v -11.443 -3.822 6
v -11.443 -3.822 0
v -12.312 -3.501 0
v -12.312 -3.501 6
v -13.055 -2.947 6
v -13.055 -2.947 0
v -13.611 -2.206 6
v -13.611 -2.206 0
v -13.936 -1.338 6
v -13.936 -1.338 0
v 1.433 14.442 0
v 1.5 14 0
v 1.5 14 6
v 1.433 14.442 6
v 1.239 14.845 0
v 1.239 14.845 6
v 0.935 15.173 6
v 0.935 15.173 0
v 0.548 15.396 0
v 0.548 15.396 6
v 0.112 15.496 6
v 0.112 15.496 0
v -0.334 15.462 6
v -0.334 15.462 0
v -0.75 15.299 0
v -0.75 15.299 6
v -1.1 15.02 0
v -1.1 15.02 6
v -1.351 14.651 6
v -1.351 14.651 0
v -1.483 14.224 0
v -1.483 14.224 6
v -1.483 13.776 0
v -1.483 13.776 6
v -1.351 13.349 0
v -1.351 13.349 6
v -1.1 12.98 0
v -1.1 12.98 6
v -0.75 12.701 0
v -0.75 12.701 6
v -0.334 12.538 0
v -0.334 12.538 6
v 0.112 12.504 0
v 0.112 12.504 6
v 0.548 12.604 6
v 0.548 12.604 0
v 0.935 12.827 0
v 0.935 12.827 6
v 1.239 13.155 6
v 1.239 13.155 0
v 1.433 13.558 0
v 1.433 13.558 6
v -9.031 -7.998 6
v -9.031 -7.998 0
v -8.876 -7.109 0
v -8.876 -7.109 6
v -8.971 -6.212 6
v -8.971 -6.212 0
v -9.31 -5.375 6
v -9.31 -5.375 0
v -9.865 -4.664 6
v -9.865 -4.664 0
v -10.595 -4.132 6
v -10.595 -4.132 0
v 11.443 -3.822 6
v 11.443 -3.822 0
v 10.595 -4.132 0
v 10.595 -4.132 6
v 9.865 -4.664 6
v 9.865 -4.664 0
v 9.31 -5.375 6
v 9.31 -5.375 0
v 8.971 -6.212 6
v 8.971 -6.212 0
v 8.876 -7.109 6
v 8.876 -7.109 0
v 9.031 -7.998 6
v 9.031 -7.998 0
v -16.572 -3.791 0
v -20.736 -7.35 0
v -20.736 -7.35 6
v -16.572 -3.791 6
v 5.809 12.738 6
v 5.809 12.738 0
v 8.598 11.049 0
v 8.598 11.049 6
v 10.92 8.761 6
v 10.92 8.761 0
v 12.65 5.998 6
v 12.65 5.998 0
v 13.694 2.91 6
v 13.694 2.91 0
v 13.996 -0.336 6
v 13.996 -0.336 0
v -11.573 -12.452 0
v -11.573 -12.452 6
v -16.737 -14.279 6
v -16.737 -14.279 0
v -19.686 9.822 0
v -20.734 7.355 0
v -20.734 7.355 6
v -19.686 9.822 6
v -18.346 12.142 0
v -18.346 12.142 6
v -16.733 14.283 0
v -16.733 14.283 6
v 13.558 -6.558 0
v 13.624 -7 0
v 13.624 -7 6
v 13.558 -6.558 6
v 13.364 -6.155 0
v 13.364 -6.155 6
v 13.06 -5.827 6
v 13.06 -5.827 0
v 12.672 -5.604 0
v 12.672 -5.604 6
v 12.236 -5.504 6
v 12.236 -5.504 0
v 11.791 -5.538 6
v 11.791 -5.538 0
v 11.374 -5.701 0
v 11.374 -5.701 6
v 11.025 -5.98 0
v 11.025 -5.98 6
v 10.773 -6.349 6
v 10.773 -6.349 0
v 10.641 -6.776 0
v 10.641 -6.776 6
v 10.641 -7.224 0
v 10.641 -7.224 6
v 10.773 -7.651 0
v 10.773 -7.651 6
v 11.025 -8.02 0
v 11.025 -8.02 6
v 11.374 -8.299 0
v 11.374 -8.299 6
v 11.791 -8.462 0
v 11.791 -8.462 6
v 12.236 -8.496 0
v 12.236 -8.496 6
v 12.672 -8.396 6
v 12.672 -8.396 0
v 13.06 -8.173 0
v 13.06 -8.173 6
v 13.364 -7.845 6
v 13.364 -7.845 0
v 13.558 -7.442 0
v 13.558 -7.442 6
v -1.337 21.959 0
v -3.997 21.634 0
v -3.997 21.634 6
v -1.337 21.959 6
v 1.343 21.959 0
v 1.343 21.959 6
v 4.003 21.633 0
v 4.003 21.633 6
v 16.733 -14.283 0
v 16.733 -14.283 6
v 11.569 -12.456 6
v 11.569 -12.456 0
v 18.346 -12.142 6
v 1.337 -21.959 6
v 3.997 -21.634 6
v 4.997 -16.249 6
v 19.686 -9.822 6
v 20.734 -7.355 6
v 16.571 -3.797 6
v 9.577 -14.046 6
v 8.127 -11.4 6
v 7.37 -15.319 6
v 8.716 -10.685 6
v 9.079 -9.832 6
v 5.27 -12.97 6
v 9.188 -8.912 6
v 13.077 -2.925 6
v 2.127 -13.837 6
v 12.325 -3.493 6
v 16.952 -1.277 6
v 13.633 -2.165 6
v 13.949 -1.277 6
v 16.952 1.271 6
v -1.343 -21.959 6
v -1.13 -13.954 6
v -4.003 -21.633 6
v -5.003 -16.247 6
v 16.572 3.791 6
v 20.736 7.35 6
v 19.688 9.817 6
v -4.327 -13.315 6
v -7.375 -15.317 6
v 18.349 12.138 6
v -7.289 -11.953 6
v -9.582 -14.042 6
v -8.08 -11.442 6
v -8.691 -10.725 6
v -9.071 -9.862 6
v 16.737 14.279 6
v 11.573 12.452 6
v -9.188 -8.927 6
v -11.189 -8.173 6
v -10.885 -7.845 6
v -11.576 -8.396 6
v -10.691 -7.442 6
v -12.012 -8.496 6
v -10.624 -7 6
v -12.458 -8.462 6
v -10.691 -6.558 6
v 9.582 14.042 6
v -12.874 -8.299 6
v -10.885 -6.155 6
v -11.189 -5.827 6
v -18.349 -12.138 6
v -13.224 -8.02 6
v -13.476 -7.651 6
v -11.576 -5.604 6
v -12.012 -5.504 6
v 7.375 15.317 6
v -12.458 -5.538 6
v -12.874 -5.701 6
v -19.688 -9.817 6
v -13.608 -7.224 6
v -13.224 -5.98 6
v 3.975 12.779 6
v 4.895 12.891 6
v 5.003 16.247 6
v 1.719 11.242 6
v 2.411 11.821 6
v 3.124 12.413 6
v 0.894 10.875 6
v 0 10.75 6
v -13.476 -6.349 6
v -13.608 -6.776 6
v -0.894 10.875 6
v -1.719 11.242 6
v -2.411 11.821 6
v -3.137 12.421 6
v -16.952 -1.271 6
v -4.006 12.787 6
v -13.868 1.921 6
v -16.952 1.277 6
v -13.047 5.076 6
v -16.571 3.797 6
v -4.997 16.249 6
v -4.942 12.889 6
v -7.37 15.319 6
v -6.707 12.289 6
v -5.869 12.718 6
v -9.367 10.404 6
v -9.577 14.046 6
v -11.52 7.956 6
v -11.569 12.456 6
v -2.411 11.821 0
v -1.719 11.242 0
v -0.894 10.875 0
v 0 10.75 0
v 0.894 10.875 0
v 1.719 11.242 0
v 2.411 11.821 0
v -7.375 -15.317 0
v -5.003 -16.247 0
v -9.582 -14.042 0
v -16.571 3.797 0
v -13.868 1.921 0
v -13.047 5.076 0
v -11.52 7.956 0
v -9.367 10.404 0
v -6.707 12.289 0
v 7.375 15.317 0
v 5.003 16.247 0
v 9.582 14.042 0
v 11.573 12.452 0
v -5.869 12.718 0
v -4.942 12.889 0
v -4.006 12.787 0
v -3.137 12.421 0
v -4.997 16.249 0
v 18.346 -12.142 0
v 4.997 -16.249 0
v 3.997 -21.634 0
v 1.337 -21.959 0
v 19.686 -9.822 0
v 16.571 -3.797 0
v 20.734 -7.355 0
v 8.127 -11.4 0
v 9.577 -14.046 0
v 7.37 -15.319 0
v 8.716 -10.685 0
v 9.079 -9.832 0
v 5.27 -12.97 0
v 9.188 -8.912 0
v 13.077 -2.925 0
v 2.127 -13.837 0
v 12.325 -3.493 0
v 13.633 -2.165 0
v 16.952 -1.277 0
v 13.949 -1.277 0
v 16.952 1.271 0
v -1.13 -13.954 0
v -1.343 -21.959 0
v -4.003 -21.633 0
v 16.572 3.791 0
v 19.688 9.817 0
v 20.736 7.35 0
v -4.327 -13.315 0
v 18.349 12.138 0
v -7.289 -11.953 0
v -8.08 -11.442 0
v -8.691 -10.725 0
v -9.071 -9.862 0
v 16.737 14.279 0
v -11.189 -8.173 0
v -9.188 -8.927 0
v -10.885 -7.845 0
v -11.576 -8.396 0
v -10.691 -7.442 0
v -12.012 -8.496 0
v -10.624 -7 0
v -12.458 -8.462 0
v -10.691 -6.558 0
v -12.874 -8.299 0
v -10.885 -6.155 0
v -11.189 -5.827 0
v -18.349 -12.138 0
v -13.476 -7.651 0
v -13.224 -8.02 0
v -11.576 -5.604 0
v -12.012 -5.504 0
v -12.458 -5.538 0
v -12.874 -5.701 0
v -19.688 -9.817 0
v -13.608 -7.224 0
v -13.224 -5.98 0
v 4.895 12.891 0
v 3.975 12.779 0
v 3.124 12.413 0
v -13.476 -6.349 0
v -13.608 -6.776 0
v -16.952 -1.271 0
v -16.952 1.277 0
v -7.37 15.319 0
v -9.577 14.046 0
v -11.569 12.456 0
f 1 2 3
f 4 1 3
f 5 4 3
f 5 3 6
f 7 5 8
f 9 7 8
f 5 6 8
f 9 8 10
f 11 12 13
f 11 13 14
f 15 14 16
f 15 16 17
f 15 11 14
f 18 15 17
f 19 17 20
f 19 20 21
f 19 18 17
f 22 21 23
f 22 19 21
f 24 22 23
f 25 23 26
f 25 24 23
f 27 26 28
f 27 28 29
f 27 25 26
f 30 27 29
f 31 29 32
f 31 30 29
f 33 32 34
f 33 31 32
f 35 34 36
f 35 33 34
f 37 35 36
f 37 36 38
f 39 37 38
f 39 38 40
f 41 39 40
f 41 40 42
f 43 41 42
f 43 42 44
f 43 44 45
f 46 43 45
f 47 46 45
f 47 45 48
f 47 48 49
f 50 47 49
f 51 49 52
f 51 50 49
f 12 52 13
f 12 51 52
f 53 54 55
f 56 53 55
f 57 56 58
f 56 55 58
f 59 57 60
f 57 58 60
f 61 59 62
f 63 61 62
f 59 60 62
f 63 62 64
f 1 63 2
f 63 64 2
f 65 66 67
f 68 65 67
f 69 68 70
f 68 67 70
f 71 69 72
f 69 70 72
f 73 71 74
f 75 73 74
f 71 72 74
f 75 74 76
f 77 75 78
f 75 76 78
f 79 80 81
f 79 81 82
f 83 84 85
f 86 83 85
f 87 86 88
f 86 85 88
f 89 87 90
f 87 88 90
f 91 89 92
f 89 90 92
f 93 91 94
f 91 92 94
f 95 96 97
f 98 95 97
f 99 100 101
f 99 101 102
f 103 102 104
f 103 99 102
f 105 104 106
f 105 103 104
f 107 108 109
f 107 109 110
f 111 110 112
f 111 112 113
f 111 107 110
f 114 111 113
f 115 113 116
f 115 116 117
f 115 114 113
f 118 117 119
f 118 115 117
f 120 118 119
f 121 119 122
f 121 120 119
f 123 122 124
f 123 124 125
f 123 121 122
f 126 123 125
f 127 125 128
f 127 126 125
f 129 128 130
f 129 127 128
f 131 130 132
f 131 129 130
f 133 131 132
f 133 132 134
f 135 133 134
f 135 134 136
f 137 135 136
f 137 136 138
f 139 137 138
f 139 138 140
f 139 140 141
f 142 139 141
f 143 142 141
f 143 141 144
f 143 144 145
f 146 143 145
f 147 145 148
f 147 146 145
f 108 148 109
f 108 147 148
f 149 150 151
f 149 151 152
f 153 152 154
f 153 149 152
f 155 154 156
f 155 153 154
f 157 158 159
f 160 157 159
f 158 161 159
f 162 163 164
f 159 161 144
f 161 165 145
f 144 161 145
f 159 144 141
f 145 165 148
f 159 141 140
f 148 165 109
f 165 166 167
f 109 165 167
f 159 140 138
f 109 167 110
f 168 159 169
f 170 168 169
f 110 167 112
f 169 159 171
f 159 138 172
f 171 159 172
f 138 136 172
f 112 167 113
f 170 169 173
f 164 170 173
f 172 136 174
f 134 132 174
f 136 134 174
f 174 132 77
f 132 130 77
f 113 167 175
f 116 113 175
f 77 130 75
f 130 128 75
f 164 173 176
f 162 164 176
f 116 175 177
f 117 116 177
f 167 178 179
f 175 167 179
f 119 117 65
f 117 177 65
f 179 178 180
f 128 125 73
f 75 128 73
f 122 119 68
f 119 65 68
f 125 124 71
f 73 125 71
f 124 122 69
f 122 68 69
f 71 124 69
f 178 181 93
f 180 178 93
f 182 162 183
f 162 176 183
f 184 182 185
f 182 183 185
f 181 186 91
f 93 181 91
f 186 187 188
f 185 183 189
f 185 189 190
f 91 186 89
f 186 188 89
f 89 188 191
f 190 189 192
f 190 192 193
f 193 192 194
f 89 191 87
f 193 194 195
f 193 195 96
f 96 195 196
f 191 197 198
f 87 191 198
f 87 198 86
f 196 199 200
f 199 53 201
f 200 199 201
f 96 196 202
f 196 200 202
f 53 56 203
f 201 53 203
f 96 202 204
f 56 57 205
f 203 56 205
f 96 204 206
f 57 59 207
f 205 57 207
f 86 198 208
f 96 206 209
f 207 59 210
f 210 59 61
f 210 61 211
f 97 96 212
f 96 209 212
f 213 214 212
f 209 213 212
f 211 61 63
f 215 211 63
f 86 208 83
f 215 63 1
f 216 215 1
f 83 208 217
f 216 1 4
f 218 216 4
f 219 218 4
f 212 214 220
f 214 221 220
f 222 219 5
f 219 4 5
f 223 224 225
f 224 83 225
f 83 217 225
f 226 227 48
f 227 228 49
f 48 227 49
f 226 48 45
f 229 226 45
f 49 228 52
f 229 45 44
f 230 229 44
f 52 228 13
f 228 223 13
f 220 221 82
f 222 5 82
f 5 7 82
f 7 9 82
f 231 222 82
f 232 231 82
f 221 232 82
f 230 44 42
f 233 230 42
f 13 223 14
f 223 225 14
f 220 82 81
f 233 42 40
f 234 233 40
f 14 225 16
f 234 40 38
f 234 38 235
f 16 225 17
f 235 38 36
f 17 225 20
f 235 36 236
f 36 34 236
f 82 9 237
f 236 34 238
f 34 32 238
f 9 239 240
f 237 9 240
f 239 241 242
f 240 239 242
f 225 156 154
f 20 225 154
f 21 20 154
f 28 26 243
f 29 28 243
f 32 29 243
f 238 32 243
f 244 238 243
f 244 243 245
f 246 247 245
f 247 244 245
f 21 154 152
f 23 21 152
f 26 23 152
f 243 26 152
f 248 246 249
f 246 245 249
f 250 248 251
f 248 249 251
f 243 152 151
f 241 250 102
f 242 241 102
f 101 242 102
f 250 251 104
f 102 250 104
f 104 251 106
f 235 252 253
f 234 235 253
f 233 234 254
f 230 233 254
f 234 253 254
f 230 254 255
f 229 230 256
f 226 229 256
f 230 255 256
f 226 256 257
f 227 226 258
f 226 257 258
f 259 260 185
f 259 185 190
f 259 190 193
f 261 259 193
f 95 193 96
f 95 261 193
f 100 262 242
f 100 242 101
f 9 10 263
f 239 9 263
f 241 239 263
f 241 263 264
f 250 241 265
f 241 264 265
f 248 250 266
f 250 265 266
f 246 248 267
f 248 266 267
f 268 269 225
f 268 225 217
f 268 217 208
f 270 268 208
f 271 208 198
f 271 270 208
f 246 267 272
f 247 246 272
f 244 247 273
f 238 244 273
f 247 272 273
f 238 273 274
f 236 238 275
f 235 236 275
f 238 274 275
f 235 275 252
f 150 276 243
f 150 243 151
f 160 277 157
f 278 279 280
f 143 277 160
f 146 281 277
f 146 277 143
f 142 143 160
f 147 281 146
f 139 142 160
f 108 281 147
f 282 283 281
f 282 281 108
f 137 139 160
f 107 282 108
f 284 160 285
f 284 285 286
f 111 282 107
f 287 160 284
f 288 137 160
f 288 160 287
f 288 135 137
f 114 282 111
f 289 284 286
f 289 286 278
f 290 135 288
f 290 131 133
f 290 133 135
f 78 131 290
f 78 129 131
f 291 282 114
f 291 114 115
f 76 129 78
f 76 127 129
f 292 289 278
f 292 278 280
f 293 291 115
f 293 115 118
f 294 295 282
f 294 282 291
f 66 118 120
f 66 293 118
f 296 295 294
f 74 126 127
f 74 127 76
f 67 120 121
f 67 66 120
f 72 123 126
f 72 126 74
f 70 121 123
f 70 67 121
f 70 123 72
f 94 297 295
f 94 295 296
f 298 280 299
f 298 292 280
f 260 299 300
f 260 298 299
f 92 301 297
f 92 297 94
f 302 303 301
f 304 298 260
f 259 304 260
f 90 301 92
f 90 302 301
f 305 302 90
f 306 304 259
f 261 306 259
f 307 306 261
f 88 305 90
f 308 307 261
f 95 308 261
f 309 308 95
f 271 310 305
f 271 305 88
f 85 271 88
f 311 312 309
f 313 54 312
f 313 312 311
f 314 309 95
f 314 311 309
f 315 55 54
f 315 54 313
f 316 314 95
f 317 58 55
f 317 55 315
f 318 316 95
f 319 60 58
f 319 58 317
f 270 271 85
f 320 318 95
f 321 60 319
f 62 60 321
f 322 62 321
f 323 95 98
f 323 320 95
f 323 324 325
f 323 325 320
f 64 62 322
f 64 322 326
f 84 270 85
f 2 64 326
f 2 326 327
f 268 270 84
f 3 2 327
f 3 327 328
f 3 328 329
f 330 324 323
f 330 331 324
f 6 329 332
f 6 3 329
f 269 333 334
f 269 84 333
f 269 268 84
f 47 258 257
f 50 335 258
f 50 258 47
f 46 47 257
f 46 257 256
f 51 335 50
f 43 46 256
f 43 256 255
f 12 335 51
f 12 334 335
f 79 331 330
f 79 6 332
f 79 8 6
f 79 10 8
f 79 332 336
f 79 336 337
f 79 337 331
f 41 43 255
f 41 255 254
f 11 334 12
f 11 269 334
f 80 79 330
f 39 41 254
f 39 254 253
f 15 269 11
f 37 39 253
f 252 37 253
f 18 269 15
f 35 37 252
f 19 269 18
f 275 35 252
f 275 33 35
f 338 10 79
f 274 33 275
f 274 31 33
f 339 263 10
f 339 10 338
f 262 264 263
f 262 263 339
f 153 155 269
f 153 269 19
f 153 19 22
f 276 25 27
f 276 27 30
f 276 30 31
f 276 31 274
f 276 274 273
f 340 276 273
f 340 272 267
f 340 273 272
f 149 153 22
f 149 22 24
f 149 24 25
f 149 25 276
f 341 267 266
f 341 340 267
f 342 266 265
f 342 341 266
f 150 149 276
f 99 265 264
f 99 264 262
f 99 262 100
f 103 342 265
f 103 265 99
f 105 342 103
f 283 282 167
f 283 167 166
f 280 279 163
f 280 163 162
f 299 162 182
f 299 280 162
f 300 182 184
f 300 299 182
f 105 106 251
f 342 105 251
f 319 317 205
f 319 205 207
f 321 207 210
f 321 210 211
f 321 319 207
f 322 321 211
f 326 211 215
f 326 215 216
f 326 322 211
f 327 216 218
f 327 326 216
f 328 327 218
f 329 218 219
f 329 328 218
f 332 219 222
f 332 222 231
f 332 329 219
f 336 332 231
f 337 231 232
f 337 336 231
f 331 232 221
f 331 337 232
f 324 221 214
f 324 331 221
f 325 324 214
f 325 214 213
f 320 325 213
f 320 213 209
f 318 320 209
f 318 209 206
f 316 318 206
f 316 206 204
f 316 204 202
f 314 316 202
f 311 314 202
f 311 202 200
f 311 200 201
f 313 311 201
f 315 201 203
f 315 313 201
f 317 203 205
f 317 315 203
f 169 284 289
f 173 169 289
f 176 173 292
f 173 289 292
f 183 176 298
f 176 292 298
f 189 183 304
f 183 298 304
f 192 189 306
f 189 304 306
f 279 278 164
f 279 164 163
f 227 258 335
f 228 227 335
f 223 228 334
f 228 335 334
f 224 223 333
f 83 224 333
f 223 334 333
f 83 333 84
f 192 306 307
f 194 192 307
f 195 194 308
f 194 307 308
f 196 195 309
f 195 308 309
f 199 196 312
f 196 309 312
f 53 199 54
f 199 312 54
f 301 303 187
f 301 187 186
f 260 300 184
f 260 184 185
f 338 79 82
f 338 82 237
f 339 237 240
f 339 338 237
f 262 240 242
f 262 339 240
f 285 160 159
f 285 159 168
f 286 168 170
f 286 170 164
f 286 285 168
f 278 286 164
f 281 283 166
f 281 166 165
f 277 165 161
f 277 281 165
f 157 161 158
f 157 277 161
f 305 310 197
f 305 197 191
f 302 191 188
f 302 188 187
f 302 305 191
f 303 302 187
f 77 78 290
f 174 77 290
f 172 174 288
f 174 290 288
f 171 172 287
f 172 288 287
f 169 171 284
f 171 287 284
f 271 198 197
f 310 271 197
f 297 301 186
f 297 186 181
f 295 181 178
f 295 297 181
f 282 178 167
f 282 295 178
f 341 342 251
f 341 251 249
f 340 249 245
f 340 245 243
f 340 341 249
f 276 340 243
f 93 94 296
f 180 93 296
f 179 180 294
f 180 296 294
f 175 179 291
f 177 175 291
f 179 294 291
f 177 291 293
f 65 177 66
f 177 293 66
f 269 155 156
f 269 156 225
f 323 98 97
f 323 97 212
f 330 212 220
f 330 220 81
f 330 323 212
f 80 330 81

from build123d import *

# Parameters (mm, degrees)
ESQUISSE1_R        = 1.5
BOSS_EXTRU_2_DEPTH = 6


with BuildPart() as part:
    # Esquisse1 → Boss.-Extru.2 (new body)
    with BuildSketch(Plane.XY):
        with BuildLine():
            Line((-4.997277712, 16.248914286), (-3.997277712, 21.633810827))
            ThreePointArc((-3.997277712, 21.633810827), (0.002768431, 21.999999826), (4.002722288, 21.632804124))
            Line((4.002722288, 21.632804124), (5.002722288, 16.247238834))
            ThreePointArc((5.002722288, 16.247238834), (8.502466554, 14.721007523), (11.573333699, 12.452226592))
            Line((11.573333699, 12.452226592), (16.7367909, 14.278649458))
            ThreePointArc((16.7367909, 14.278649458), (19.053942948, 10.997602381), (20.735919071, 7.349942877))
            Line((20.735919071, 7.349942877), (16.571882715, 3.791134828))
            ThreePointArc((16.571882715, 3.791134828), (16.999999761, -0.002848269), (16.570611412, -3.796687694))
            Line((16.570611412, -3.796687694), (20.734068613, -7.355161368))
            ThreePointArc((20.734068613, -7.355161368), (19.051174517, -11.002397445), (16.733196783, -14.282861248))
            Line((16.733196783, -14.282861248), (11.569160427, -12.456104006))
            ThreePointArc((11.569160427, -12.456104006), (8.497533208, -14.723855792), (4.997277712, -16.248914286))
            Line((4.997277712, -16.248914286), (3.997277712, -21.633810827))
            ThreePointArc((3.997277712, -21.633810827), (-0.002768431, -21.999999826), (-4.002722288, -21.632804124))
            Line((-4.002722288, -21.632804124), (-5.002722288, -16.247238834))
            ThreePointArc((-5.002722288, -16.247238834), (-8.502466554, -14.721007523), (-11.573333699, -12.452226592))
            Line((-11.573333699, -12.452226592), (-16.7367909, -14.278649458))
            ThreePointArc((-16.7367909, -14.278649458), (-19.053942948, -10.997602381), (-20.735919071, -7.349942877))
            Line((-20.735919071, -7.349942877), (-16.571882715, -3.791134828))
            ThreePointArc((-16.571882715, -3.791134828), (-16.999999761, 0.002848269), (-16.570611412, 3.796687694))
            Line((-16.570611412, 3.796687694), (-20.734068613, 7.355161368))
            ThreePointArc((-20.734068613, 7.355161368), (-19.051174517, 11.002397445), (-16.733196783, 14.282861248))
            Line((-16.733196783, 14.282861248), (-11.569160427, 12.456104006))
            ThreePointArc((-11.569160427, 12.456104006), (-8.497533208, 14.723855792), (-4.997277712, 16.248914286))
        make_face()
        with Locations((0, 14)):
            Circle(ESQUISSE1_R, mode=Mode.SUBTRACT)
        with Locations((12.124355653, -7)):
            Circle(ESQUISSE1_R, mode=Mode.SUBTRACT)
        with Locations((-12.124355653, -7)):
            Circle(ESQUISSE1_R, mode=Mode.SUBTRACT)
        with BuildLine():
            ThreePointArc((-2.411034891, 11.820685714), (0, 10.75), (2.411034891, 11.820685714))
            ThreePointArc((2.411034891, 11.820685714), (3.975330286, 12.779130538), (5.80943088, 12.737759334))
            ThreePointArc((5.80943088, 12.737759334), (11.865562564, 7.430237213), (13.995977593, -0.335575935))
            ThreePointArc((13.995977593, -0.335575935), (13.382779595, -2.564868949), (11.442531564, -3.822325392))
            ThreePointArc((11.442531564, -3.822325392), (9.309773091, -5.375), (9.031496673, -7.998360322))
            ThreePointArc((9.031496673, -7.998360322), (9.079386541, -9.832302285), (8.126507731, -11.399994391))
            ThreePointArc((8.126507731, -11.399994391), (0.5019929, -13.990997217), (-7.288606081, -11.953084179))
            ThreePointArc((-7.288606081, -11.953084179), (-8.912631465, -10.307392628), (-9.031496673, -7.998360322))
            ThreePointArc((-9.031496673, -7.998360322), (-9.309773091, -5.375), (-11.442531564, -3.822325392))
            ThreePointArc((-11.442531564, -3.822325392), (-13.054716827, -2.946828253), (-13.935938611, -1.337764944))
            ThreePointArc((-13.935938611, -1.337764944), (-12.367555464, 6.560760004), (-6.707371512, 12.288660114))
            ThreePointArc((-6.707371512, 12.288660114), (-4.47014813, 12.872261577), (-2.411034891, 11.820685714))
        make_face(mode=Mode.SUBTRACT)
    extrude(amount=BOSS_EXTRU_2_DEPTH)


solid = part.part
